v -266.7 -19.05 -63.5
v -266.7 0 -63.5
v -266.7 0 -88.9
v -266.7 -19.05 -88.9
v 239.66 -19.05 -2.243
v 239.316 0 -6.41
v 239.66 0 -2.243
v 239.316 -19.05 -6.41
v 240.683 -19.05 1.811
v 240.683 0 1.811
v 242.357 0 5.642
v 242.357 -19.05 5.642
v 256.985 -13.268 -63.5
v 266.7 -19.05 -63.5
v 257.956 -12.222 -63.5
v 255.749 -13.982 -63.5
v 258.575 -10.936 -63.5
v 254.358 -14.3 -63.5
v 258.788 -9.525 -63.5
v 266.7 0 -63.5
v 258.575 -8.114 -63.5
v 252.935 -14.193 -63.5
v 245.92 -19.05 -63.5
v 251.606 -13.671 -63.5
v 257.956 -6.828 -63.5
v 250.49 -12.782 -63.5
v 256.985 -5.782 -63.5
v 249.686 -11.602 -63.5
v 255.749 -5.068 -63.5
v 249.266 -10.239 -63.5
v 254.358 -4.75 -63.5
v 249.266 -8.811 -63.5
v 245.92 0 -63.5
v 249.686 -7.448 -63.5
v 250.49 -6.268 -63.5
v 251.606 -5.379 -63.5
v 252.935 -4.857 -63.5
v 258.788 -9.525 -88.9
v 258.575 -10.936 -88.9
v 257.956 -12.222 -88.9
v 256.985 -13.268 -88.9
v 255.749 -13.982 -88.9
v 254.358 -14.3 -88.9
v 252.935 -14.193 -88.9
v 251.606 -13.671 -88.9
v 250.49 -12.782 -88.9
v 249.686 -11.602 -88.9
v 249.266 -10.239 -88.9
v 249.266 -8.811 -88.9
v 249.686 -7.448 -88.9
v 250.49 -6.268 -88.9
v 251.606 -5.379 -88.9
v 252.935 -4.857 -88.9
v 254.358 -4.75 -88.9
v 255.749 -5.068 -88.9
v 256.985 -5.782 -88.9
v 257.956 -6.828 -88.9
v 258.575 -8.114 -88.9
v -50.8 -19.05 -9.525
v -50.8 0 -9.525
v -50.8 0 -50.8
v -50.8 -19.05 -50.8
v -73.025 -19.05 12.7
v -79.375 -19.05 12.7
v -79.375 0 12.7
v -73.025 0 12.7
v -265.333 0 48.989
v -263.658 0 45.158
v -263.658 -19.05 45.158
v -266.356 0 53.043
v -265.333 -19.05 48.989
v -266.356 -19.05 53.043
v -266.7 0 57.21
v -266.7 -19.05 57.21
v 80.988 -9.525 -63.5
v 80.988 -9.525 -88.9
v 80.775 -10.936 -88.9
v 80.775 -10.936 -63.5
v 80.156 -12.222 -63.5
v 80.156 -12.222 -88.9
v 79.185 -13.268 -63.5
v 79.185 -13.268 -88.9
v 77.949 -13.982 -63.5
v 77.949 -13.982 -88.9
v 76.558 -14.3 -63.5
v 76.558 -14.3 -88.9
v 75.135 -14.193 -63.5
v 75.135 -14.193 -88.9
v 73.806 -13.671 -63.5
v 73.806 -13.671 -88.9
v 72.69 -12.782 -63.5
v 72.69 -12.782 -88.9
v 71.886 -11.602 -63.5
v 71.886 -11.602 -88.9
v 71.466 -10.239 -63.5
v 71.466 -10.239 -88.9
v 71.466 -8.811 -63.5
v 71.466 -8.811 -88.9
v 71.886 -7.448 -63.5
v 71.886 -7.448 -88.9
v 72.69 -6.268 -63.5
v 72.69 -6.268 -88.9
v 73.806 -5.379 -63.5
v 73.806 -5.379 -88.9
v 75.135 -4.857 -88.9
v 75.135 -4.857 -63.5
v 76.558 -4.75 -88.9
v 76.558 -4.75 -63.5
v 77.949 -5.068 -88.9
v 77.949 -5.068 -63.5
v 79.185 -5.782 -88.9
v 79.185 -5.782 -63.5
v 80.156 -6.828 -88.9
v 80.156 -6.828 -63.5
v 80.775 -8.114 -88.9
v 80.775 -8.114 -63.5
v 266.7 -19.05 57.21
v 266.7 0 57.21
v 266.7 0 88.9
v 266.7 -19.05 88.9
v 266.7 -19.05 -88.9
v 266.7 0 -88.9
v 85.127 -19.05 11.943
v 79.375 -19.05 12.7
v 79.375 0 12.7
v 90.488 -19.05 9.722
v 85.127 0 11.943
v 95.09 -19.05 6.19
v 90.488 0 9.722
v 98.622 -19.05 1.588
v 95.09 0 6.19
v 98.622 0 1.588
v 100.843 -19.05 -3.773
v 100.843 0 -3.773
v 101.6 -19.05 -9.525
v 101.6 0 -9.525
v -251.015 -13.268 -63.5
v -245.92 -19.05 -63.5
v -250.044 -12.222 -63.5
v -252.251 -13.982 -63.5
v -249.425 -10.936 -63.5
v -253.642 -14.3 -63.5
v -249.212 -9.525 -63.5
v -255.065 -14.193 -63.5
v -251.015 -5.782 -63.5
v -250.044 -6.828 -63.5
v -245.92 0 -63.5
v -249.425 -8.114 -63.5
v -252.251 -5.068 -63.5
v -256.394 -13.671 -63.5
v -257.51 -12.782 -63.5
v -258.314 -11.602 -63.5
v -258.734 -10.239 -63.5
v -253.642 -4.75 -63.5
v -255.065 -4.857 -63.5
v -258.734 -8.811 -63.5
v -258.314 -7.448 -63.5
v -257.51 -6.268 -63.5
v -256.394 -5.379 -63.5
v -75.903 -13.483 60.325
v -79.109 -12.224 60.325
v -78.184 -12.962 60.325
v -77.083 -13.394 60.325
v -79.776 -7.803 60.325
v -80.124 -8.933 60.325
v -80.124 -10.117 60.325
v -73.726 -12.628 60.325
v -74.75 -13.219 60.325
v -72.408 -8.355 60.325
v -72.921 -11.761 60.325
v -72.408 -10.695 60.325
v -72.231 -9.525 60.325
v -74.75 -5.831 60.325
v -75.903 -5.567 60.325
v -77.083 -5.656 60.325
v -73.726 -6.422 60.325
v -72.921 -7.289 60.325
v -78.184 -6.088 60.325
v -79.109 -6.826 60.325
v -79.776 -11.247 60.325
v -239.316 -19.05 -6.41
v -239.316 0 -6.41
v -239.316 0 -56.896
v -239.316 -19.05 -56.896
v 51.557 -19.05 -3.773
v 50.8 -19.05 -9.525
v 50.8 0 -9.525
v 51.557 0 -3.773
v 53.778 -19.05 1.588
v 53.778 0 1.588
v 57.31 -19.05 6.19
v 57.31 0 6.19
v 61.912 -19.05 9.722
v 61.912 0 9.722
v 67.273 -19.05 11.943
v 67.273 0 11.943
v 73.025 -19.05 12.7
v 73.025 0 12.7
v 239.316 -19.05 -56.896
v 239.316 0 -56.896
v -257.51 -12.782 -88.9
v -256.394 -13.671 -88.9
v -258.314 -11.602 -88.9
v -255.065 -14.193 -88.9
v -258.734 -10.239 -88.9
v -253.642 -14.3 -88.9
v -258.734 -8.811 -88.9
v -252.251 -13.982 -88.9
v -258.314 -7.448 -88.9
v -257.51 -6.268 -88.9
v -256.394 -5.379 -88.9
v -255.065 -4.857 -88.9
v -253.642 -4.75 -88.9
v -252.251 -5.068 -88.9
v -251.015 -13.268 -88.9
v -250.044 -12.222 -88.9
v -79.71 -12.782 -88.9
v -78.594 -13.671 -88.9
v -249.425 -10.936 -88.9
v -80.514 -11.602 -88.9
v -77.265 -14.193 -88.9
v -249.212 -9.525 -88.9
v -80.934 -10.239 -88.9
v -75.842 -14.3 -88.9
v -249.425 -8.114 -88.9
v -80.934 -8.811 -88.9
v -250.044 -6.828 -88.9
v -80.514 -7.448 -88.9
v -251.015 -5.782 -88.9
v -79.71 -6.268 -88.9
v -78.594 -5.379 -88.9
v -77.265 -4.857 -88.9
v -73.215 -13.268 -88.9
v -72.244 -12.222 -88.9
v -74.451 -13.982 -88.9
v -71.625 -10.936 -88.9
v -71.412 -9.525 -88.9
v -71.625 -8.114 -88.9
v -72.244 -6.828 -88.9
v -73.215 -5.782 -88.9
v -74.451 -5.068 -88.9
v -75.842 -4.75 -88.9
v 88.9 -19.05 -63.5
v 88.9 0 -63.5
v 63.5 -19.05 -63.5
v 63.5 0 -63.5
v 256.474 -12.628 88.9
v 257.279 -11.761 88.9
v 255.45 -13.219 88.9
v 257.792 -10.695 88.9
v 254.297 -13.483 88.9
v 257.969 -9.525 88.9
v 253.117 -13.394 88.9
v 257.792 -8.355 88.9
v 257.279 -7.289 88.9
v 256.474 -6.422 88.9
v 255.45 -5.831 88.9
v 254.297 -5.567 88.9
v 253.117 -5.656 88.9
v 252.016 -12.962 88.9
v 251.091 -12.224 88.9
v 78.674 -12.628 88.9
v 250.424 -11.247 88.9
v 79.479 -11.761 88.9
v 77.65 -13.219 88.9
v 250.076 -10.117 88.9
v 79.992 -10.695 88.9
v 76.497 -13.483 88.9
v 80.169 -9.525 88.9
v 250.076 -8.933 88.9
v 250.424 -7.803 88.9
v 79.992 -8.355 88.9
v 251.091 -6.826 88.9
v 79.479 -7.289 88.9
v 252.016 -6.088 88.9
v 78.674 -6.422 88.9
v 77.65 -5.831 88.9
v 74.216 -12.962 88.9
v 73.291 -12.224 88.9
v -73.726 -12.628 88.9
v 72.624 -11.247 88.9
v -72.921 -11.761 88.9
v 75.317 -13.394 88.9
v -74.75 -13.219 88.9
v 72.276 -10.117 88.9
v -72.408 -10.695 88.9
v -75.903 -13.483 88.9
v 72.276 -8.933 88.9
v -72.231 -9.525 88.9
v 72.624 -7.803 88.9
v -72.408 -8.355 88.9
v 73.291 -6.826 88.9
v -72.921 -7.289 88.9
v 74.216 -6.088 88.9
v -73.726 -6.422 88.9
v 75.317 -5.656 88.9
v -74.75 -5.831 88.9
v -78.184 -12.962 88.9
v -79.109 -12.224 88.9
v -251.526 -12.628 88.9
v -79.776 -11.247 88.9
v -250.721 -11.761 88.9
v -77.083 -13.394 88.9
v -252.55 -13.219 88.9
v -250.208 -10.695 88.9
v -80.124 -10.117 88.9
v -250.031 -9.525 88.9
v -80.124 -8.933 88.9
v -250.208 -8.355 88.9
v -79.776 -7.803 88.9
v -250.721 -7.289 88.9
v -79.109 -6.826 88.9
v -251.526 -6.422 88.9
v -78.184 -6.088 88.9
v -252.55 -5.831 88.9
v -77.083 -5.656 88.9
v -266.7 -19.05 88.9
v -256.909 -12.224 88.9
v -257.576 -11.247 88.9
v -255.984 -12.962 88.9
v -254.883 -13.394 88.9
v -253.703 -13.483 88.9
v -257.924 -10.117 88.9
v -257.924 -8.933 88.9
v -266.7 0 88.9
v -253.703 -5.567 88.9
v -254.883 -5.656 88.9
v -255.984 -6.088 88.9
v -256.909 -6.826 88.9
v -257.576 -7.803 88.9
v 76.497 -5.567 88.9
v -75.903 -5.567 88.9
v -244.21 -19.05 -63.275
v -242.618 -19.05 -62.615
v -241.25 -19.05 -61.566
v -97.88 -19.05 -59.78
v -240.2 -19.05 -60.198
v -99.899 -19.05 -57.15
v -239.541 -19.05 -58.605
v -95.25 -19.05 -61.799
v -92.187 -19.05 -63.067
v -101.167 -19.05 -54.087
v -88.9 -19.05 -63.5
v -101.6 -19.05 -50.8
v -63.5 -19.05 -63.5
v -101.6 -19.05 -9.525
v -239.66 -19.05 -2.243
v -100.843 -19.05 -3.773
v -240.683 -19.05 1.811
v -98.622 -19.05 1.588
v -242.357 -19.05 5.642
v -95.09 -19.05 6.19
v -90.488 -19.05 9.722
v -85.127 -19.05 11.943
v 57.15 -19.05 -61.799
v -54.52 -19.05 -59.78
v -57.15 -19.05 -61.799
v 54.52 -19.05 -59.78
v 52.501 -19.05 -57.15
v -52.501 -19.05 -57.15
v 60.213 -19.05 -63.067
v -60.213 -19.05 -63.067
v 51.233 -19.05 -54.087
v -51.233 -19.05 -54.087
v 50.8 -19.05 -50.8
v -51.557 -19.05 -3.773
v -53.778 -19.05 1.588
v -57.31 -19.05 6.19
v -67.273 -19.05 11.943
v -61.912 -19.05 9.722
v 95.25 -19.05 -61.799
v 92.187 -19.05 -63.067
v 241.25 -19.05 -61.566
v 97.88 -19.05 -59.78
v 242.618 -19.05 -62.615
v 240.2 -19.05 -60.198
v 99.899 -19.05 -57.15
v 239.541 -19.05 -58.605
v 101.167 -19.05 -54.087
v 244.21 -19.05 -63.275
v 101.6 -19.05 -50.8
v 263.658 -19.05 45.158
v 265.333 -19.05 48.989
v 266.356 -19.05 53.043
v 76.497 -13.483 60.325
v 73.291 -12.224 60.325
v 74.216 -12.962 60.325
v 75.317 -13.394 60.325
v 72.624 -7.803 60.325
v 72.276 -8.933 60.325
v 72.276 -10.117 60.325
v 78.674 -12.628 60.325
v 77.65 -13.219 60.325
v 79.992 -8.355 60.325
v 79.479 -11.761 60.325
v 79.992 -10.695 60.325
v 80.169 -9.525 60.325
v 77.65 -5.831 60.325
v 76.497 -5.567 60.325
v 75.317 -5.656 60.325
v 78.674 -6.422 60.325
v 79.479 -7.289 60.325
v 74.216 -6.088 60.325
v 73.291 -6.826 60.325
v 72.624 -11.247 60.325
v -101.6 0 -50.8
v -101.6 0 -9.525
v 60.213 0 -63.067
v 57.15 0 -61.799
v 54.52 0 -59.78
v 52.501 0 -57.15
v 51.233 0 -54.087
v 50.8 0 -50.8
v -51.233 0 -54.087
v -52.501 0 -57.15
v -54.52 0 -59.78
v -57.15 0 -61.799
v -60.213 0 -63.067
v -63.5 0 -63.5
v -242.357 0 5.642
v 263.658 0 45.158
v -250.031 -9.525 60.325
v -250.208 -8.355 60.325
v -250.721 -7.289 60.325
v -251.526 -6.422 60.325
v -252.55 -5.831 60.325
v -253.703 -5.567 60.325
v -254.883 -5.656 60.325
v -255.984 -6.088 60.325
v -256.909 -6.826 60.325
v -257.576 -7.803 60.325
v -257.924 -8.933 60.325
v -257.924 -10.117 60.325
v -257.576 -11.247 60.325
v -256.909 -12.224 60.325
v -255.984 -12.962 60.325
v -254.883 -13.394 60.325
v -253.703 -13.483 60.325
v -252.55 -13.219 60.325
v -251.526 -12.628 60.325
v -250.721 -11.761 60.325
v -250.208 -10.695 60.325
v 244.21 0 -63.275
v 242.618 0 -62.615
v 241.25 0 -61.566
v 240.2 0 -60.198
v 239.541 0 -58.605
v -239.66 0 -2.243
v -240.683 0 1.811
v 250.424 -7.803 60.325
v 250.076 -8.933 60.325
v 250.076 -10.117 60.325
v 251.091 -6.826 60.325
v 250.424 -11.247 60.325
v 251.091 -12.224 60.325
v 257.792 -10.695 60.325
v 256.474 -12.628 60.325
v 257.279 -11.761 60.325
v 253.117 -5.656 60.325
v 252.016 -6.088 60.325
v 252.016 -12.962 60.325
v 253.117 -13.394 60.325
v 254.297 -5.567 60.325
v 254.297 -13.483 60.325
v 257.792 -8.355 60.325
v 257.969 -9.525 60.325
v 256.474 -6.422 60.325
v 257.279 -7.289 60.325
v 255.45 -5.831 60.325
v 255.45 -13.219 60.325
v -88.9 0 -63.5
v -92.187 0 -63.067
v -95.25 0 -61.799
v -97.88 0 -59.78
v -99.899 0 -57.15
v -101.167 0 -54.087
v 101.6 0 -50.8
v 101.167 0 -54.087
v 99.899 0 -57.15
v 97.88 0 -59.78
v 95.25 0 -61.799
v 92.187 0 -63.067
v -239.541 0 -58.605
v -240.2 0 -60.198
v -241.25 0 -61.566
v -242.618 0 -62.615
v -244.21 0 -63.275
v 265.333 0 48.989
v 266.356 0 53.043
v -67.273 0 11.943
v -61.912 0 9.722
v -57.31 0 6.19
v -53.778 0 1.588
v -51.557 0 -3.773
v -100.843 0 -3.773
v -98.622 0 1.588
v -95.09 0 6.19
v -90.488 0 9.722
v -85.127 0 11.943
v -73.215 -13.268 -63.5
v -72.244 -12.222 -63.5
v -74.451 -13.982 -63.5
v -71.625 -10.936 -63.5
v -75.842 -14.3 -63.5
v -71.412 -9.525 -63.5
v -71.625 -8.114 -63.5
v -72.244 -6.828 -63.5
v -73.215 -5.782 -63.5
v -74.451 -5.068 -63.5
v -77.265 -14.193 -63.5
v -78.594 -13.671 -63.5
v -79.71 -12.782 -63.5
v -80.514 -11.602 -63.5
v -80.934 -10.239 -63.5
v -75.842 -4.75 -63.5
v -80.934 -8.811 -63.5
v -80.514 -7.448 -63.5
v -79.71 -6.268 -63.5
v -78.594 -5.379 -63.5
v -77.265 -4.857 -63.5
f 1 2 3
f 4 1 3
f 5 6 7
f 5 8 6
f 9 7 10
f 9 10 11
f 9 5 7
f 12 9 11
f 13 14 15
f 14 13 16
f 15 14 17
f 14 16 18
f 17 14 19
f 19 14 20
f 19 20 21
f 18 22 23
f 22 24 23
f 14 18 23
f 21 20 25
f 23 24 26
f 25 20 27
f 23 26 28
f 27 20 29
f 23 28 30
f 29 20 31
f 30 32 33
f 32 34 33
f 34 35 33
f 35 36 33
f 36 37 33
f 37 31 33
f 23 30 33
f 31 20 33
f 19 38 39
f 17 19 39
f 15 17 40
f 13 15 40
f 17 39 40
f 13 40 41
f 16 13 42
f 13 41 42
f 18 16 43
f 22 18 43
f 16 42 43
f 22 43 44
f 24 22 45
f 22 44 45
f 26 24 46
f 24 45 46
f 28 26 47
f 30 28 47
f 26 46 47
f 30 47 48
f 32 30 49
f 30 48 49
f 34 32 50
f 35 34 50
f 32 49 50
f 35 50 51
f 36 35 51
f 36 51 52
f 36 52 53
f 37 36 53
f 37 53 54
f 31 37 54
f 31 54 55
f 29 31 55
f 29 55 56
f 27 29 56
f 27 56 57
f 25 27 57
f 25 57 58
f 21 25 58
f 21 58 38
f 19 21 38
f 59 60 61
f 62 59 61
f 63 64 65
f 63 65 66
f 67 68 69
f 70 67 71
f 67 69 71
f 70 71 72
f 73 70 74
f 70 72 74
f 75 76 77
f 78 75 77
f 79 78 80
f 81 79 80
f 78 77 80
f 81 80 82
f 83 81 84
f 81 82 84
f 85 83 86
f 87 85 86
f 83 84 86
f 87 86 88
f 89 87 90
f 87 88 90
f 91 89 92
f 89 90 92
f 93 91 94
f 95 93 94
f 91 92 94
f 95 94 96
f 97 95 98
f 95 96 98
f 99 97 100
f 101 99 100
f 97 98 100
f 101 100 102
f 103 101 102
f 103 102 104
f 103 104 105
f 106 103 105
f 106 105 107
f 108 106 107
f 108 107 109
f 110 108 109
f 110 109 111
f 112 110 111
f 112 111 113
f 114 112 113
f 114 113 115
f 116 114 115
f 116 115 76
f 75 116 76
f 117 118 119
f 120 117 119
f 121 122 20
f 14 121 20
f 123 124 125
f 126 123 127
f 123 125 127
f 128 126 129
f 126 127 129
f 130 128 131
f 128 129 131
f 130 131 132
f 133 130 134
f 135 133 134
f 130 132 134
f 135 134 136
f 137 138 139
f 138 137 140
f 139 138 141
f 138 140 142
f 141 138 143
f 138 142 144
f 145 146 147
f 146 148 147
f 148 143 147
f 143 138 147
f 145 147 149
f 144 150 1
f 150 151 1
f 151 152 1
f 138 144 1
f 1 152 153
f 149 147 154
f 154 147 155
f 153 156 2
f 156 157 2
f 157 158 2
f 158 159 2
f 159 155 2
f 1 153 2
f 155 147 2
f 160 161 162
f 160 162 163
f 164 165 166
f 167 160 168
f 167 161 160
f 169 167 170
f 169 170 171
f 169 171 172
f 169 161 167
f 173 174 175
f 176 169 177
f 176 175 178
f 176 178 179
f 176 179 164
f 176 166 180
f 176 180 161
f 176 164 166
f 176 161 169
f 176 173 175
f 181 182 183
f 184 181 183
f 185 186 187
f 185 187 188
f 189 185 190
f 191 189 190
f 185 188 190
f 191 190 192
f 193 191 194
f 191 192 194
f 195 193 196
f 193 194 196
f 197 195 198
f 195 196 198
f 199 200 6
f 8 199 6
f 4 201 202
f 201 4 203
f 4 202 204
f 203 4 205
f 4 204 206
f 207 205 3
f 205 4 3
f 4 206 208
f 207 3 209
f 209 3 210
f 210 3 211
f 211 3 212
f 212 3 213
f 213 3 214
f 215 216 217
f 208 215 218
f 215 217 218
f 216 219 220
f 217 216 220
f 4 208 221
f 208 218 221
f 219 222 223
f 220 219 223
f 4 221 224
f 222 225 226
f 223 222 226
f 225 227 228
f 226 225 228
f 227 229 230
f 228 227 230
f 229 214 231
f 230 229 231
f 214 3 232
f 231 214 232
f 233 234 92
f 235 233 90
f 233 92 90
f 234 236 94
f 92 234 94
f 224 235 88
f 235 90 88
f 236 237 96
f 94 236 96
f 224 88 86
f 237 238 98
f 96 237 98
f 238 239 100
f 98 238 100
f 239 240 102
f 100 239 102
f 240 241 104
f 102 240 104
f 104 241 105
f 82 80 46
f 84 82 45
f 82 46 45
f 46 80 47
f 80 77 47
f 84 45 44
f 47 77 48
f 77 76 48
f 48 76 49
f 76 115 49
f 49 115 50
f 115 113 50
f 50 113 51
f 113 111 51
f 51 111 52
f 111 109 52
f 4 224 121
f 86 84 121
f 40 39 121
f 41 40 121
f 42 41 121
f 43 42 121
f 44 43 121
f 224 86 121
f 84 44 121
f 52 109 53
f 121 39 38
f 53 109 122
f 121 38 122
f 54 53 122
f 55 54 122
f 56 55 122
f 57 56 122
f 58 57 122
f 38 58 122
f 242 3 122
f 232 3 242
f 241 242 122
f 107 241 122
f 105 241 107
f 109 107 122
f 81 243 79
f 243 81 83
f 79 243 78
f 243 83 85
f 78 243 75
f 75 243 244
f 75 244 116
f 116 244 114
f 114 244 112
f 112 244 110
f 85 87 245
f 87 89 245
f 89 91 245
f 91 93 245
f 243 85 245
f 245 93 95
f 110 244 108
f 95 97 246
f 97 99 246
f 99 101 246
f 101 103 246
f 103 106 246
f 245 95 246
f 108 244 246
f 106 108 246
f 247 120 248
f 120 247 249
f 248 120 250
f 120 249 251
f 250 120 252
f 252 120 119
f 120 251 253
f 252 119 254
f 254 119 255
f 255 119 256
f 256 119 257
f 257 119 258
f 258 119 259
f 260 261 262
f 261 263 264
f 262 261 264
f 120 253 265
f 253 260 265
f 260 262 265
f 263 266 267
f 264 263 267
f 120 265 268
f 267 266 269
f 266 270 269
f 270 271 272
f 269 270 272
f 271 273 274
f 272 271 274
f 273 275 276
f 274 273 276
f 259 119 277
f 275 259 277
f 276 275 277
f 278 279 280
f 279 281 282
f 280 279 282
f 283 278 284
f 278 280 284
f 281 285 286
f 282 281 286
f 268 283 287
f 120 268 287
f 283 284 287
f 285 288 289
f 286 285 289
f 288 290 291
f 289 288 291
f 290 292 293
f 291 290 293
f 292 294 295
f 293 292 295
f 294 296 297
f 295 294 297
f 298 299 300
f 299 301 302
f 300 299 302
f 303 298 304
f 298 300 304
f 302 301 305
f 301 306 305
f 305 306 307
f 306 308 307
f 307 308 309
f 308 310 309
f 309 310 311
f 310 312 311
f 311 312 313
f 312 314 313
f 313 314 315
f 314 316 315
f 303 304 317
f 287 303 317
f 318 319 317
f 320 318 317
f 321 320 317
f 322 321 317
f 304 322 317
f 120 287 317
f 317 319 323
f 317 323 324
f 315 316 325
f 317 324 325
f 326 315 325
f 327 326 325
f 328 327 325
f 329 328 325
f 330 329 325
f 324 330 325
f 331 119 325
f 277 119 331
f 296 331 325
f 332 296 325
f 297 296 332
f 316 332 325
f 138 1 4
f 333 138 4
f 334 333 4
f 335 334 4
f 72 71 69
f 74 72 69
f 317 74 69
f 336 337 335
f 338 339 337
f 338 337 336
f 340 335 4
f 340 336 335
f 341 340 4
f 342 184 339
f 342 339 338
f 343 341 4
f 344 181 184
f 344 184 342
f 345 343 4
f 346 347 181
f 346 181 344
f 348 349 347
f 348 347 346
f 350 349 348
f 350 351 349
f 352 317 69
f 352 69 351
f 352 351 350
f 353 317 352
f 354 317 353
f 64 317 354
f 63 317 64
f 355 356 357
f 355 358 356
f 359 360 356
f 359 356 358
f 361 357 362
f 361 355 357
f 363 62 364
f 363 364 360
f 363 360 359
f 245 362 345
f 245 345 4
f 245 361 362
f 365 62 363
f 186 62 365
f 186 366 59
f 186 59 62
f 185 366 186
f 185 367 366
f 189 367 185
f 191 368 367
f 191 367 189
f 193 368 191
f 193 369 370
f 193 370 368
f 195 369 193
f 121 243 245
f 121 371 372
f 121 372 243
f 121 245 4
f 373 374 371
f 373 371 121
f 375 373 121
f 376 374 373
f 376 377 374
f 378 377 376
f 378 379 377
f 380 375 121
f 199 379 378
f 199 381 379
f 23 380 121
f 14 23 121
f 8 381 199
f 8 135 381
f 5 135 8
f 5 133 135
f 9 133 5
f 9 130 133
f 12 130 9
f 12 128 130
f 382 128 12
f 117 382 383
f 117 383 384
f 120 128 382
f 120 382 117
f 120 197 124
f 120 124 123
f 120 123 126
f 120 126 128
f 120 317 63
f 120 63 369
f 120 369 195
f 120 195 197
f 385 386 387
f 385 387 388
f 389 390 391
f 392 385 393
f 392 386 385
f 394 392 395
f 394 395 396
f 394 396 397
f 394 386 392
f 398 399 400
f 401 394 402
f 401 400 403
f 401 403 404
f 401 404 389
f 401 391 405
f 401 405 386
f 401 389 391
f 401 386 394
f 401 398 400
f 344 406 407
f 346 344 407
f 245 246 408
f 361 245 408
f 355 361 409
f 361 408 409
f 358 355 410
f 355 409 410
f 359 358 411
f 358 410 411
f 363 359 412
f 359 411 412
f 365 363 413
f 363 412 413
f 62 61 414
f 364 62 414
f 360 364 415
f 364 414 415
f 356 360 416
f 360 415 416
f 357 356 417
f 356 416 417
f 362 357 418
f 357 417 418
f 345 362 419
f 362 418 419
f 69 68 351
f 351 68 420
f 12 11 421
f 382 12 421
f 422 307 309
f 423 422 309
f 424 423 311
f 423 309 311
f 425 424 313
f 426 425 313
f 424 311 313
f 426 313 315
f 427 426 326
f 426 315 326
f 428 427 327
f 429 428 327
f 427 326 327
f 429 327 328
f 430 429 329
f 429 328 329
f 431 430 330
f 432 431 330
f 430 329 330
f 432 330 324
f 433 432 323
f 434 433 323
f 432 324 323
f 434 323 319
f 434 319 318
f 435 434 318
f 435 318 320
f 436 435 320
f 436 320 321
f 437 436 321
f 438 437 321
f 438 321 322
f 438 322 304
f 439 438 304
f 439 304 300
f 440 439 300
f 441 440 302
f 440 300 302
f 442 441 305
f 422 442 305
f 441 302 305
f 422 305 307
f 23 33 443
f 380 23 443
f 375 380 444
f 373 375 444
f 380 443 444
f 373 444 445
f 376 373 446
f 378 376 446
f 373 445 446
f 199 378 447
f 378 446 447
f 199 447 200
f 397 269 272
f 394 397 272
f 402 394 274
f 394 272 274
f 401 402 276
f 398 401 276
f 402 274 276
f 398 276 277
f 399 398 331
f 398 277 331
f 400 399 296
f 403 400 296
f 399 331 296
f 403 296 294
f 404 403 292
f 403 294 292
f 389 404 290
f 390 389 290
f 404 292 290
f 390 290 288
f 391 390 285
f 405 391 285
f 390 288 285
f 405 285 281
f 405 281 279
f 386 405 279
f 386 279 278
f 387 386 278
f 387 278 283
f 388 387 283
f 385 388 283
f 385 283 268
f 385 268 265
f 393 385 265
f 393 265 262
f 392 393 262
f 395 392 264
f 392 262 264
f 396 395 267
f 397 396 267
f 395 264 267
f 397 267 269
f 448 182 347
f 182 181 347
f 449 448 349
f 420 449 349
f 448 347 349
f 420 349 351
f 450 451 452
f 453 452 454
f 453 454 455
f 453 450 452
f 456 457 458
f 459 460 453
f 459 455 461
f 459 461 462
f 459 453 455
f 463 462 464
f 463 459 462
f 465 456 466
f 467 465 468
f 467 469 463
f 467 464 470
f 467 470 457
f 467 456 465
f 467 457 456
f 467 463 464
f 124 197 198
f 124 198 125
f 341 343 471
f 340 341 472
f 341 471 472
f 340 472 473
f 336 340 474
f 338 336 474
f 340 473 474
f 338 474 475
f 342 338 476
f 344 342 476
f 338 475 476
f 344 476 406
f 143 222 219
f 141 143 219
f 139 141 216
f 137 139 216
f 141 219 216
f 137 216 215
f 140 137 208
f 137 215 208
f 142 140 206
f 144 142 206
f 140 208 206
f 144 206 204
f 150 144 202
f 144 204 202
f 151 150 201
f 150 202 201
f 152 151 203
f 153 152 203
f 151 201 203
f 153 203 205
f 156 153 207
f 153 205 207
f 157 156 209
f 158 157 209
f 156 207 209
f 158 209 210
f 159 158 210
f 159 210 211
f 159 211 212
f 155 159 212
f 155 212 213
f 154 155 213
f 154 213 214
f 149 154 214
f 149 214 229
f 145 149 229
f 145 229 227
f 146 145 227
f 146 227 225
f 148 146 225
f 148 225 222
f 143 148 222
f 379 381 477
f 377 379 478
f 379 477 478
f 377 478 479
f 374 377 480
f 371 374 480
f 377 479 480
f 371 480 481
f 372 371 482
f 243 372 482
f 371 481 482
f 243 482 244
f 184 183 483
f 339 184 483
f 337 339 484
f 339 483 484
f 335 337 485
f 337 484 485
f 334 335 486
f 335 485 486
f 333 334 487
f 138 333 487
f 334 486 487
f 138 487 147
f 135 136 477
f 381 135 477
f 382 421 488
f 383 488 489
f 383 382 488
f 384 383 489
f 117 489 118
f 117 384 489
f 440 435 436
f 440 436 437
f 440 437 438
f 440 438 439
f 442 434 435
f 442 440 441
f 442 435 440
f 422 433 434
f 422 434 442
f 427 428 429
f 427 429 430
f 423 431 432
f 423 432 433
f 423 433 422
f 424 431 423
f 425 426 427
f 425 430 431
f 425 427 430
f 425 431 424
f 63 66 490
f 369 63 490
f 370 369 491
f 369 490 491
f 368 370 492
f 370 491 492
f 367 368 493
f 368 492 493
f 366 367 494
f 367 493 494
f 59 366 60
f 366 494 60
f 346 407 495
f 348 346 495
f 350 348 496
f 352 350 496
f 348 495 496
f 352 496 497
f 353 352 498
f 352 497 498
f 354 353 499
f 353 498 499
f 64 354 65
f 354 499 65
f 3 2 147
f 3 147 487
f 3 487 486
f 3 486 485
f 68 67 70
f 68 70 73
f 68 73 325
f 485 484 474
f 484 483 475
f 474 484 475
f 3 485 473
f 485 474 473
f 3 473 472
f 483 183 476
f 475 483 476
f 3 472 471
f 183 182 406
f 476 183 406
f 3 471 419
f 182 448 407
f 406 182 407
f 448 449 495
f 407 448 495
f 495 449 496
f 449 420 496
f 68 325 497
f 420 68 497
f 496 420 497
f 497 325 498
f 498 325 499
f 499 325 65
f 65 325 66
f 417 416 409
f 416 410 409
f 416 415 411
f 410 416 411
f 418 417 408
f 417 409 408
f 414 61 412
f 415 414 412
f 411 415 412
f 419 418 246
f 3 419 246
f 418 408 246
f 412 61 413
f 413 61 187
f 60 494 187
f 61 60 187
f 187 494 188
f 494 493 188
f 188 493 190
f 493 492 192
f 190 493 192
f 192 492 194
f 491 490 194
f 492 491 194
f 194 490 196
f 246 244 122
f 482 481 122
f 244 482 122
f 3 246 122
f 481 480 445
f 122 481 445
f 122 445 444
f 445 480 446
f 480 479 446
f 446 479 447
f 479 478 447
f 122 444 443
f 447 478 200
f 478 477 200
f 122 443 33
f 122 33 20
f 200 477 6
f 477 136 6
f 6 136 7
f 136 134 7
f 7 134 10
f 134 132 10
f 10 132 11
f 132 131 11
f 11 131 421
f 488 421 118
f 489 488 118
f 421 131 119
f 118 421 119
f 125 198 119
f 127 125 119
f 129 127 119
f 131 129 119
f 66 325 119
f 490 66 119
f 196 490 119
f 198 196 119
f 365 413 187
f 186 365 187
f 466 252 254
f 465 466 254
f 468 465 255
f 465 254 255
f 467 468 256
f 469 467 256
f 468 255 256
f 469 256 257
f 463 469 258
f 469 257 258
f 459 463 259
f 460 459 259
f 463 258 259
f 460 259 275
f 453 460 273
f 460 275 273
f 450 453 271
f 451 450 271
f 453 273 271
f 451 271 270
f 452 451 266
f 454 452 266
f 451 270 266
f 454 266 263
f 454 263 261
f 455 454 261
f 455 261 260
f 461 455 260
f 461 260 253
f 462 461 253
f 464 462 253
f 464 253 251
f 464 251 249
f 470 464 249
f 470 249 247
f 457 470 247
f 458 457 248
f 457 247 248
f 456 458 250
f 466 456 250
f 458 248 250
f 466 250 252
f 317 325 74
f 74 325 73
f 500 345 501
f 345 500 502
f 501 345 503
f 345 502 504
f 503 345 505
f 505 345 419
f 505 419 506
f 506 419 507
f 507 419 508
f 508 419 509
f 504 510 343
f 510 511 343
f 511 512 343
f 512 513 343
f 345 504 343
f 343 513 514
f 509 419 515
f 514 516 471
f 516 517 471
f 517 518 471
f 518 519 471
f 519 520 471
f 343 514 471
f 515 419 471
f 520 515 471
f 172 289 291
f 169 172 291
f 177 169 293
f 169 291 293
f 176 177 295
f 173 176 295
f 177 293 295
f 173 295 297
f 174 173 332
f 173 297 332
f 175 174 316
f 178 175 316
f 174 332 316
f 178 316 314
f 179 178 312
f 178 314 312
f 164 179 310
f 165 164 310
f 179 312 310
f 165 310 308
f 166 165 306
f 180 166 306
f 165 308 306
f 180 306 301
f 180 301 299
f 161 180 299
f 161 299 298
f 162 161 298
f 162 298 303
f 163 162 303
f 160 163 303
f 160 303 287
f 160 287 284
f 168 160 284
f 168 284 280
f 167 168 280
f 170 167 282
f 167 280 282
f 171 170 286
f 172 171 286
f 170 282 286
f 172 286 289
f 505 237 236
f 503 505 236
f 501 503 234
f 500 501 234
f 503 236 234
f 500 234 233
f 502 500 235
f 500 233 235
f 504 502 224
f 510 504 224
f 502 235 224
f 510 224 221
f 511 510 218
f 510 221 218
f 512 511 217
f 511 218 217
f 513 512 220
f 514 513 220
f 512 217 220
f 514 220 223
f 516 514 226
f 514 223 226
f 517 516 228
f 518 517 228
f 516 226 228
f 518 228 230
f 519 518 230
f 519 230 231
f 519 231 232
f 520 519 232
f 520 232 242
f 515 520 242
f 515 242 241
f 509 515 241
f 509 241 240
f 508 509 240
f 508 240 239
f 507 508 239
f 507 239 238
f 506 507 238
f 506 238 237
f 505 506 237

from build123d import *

# Parameters (mm, degrees)
F1_DEPTH = 19.05
F2_R     = 25.4
F3_R     = 4.7879
F4_DEPTH = 33.02
F5_R     = 3.96875
F6_DEPTH = 28.575


# Not quite as in the source:
# - a feature names something its author has since deleted; it is built from what else it names


with BuildPart() as f1:
    # F0 (on Front) → F1 (new body)
    with BuildSketch(Plane.XZ):
        with BuildLine():
            Line((-266.7, -63.5), (-266.7, -88.9))
            Line((-266.7, -88.9), (266.7, -88.9))
            Line((266.7, -88.9), (266.7, -63.5))
            Line((266.7, -63.5), (245.919625, -63.5))
            ThreePointArc((245.919625, -63.5), (241.249891817, -61.565733183), (239.315625, -56.896))
            Line((239.315625, -56.896), (239.315625, 0))
            Line((239.315625, 0), (266.7, 50.8))
            Line((266.7, 50.8), (266.7, 88.9))
            Line((266.7, 88.9), (-266.7, 88.9))
            Line((-266.7, 88.9), (-266.7, 50.8))
            Line((-266.7, 50.8), (-239.315625, 0))
            Line((-239.315625, 0), (-239.315625, -56.896))
            ThreePointArc((-239.315625, -56.896), (-241.249891817, -61.565733183), (-245.919625, -63.5))
            Line((-245.919625, -63.5), (-266.7, -63.5))
        make_face()
        with BuildLine():
            Line((-63.5, -63.5), (-88.9, -63.5))
            ThreePointArc((-88.9, -63.5), (-97.8802561211, -59.7802561211), (-101.6, -50.8))
            Line((-101.6, -50.8), (-101.6, -9.525))
            ThreePointArc((-101.6, -9.525), (-95.0904482119, 6.1904482119), (-79.375, 12.7))
            Line((-79.375, 12.7), (-73.025, 12.7))
            ThreePointArc((-73.025, 12.7), (-57.3095517881, 6.1904482119), (-50.8, -9.525))
            Line((-50.8, -9.525), (-50.8, -50.8))
            ThreePointArc((-50.8, -50.8), (-54.5197438789, -59.7802561211), (-63.5, -63.5))
        make_face(mode=Mode.SUBTRACT)
        with BuildLine():
            ThreePointArc((63.5, -63.5), (54.5197438789, -59.7802561211), (50.8, -50.8))
            Line((50.8, -50.8), (50.8, -9.525))
            ThreePointArc((50.8, -9.525), (57.3095517881, 6.1904482119), (73.025, 12.7))
            Line((73.025, 12.7), (79.375, 12.7))
            ThreePointArc((79.375, 12.7), (95.0904482119, 6.1904482119), (101.6, -9.525))
            Line((101.6, -9.525), (101.6, -50.8))
            ThreePointArc((101.6, -50.8), (97.8802561211, -59.7802561211), (88.9, -63.5))
            Line((88.9, -63.5), (63.5, -63.5))
        make_face(mode=Mode.SUBTRACT)
    extrude(amount=F1_DEPTH)

    # F2
    f2_edges = [f1.edges().sort_by_distance(p)[0] for p in [
        (-266.7, -9.525, 50.8),
        (-239.315625, -9.525, 0),
        (266.7, -9.525, 50.8),
        (239.315625, -9.525, 0),
    ]]
    fillet(f2_edges, radius=F2_R)

    # F3 (on face) → F4 (cut)
    with BuildSketch(Plane(origin=(0, 0, -88.9), x_dir=(1, 0, 0), z_dir=(0, 0, -1))):
        with Locations((-254, 9.525)):
            Circle(F3_R)
        with Locations((-76.2, 9.525)):
            Circle(F3_R)
        with Locations((254, 9.525)):
            Circle(F3_R)
        with Locations((76.2, 9.525)):
            Circle(F3_R)
    extrude(amount=-F4_DEPTH, mode=Mode.SUBTRACT)

    # F5 (on face) → F6 (cut)
    with BuildSketch(Plane.XY.offset(88.9)):
        with Locations((-254, -9.525)):
            Circle(F5_R)
        with Locations((-76.2, -9.525)):
            Circle(F5_R)
        with Locations((76.2, -9.525)):
            Circle(F5_R)
        with Locations((254, -9.525)):
            Circle(F5_R)
    extrude(amount=-F6_DEPTH, mode=Mode.SUBTRACT)


solid = f1.part
